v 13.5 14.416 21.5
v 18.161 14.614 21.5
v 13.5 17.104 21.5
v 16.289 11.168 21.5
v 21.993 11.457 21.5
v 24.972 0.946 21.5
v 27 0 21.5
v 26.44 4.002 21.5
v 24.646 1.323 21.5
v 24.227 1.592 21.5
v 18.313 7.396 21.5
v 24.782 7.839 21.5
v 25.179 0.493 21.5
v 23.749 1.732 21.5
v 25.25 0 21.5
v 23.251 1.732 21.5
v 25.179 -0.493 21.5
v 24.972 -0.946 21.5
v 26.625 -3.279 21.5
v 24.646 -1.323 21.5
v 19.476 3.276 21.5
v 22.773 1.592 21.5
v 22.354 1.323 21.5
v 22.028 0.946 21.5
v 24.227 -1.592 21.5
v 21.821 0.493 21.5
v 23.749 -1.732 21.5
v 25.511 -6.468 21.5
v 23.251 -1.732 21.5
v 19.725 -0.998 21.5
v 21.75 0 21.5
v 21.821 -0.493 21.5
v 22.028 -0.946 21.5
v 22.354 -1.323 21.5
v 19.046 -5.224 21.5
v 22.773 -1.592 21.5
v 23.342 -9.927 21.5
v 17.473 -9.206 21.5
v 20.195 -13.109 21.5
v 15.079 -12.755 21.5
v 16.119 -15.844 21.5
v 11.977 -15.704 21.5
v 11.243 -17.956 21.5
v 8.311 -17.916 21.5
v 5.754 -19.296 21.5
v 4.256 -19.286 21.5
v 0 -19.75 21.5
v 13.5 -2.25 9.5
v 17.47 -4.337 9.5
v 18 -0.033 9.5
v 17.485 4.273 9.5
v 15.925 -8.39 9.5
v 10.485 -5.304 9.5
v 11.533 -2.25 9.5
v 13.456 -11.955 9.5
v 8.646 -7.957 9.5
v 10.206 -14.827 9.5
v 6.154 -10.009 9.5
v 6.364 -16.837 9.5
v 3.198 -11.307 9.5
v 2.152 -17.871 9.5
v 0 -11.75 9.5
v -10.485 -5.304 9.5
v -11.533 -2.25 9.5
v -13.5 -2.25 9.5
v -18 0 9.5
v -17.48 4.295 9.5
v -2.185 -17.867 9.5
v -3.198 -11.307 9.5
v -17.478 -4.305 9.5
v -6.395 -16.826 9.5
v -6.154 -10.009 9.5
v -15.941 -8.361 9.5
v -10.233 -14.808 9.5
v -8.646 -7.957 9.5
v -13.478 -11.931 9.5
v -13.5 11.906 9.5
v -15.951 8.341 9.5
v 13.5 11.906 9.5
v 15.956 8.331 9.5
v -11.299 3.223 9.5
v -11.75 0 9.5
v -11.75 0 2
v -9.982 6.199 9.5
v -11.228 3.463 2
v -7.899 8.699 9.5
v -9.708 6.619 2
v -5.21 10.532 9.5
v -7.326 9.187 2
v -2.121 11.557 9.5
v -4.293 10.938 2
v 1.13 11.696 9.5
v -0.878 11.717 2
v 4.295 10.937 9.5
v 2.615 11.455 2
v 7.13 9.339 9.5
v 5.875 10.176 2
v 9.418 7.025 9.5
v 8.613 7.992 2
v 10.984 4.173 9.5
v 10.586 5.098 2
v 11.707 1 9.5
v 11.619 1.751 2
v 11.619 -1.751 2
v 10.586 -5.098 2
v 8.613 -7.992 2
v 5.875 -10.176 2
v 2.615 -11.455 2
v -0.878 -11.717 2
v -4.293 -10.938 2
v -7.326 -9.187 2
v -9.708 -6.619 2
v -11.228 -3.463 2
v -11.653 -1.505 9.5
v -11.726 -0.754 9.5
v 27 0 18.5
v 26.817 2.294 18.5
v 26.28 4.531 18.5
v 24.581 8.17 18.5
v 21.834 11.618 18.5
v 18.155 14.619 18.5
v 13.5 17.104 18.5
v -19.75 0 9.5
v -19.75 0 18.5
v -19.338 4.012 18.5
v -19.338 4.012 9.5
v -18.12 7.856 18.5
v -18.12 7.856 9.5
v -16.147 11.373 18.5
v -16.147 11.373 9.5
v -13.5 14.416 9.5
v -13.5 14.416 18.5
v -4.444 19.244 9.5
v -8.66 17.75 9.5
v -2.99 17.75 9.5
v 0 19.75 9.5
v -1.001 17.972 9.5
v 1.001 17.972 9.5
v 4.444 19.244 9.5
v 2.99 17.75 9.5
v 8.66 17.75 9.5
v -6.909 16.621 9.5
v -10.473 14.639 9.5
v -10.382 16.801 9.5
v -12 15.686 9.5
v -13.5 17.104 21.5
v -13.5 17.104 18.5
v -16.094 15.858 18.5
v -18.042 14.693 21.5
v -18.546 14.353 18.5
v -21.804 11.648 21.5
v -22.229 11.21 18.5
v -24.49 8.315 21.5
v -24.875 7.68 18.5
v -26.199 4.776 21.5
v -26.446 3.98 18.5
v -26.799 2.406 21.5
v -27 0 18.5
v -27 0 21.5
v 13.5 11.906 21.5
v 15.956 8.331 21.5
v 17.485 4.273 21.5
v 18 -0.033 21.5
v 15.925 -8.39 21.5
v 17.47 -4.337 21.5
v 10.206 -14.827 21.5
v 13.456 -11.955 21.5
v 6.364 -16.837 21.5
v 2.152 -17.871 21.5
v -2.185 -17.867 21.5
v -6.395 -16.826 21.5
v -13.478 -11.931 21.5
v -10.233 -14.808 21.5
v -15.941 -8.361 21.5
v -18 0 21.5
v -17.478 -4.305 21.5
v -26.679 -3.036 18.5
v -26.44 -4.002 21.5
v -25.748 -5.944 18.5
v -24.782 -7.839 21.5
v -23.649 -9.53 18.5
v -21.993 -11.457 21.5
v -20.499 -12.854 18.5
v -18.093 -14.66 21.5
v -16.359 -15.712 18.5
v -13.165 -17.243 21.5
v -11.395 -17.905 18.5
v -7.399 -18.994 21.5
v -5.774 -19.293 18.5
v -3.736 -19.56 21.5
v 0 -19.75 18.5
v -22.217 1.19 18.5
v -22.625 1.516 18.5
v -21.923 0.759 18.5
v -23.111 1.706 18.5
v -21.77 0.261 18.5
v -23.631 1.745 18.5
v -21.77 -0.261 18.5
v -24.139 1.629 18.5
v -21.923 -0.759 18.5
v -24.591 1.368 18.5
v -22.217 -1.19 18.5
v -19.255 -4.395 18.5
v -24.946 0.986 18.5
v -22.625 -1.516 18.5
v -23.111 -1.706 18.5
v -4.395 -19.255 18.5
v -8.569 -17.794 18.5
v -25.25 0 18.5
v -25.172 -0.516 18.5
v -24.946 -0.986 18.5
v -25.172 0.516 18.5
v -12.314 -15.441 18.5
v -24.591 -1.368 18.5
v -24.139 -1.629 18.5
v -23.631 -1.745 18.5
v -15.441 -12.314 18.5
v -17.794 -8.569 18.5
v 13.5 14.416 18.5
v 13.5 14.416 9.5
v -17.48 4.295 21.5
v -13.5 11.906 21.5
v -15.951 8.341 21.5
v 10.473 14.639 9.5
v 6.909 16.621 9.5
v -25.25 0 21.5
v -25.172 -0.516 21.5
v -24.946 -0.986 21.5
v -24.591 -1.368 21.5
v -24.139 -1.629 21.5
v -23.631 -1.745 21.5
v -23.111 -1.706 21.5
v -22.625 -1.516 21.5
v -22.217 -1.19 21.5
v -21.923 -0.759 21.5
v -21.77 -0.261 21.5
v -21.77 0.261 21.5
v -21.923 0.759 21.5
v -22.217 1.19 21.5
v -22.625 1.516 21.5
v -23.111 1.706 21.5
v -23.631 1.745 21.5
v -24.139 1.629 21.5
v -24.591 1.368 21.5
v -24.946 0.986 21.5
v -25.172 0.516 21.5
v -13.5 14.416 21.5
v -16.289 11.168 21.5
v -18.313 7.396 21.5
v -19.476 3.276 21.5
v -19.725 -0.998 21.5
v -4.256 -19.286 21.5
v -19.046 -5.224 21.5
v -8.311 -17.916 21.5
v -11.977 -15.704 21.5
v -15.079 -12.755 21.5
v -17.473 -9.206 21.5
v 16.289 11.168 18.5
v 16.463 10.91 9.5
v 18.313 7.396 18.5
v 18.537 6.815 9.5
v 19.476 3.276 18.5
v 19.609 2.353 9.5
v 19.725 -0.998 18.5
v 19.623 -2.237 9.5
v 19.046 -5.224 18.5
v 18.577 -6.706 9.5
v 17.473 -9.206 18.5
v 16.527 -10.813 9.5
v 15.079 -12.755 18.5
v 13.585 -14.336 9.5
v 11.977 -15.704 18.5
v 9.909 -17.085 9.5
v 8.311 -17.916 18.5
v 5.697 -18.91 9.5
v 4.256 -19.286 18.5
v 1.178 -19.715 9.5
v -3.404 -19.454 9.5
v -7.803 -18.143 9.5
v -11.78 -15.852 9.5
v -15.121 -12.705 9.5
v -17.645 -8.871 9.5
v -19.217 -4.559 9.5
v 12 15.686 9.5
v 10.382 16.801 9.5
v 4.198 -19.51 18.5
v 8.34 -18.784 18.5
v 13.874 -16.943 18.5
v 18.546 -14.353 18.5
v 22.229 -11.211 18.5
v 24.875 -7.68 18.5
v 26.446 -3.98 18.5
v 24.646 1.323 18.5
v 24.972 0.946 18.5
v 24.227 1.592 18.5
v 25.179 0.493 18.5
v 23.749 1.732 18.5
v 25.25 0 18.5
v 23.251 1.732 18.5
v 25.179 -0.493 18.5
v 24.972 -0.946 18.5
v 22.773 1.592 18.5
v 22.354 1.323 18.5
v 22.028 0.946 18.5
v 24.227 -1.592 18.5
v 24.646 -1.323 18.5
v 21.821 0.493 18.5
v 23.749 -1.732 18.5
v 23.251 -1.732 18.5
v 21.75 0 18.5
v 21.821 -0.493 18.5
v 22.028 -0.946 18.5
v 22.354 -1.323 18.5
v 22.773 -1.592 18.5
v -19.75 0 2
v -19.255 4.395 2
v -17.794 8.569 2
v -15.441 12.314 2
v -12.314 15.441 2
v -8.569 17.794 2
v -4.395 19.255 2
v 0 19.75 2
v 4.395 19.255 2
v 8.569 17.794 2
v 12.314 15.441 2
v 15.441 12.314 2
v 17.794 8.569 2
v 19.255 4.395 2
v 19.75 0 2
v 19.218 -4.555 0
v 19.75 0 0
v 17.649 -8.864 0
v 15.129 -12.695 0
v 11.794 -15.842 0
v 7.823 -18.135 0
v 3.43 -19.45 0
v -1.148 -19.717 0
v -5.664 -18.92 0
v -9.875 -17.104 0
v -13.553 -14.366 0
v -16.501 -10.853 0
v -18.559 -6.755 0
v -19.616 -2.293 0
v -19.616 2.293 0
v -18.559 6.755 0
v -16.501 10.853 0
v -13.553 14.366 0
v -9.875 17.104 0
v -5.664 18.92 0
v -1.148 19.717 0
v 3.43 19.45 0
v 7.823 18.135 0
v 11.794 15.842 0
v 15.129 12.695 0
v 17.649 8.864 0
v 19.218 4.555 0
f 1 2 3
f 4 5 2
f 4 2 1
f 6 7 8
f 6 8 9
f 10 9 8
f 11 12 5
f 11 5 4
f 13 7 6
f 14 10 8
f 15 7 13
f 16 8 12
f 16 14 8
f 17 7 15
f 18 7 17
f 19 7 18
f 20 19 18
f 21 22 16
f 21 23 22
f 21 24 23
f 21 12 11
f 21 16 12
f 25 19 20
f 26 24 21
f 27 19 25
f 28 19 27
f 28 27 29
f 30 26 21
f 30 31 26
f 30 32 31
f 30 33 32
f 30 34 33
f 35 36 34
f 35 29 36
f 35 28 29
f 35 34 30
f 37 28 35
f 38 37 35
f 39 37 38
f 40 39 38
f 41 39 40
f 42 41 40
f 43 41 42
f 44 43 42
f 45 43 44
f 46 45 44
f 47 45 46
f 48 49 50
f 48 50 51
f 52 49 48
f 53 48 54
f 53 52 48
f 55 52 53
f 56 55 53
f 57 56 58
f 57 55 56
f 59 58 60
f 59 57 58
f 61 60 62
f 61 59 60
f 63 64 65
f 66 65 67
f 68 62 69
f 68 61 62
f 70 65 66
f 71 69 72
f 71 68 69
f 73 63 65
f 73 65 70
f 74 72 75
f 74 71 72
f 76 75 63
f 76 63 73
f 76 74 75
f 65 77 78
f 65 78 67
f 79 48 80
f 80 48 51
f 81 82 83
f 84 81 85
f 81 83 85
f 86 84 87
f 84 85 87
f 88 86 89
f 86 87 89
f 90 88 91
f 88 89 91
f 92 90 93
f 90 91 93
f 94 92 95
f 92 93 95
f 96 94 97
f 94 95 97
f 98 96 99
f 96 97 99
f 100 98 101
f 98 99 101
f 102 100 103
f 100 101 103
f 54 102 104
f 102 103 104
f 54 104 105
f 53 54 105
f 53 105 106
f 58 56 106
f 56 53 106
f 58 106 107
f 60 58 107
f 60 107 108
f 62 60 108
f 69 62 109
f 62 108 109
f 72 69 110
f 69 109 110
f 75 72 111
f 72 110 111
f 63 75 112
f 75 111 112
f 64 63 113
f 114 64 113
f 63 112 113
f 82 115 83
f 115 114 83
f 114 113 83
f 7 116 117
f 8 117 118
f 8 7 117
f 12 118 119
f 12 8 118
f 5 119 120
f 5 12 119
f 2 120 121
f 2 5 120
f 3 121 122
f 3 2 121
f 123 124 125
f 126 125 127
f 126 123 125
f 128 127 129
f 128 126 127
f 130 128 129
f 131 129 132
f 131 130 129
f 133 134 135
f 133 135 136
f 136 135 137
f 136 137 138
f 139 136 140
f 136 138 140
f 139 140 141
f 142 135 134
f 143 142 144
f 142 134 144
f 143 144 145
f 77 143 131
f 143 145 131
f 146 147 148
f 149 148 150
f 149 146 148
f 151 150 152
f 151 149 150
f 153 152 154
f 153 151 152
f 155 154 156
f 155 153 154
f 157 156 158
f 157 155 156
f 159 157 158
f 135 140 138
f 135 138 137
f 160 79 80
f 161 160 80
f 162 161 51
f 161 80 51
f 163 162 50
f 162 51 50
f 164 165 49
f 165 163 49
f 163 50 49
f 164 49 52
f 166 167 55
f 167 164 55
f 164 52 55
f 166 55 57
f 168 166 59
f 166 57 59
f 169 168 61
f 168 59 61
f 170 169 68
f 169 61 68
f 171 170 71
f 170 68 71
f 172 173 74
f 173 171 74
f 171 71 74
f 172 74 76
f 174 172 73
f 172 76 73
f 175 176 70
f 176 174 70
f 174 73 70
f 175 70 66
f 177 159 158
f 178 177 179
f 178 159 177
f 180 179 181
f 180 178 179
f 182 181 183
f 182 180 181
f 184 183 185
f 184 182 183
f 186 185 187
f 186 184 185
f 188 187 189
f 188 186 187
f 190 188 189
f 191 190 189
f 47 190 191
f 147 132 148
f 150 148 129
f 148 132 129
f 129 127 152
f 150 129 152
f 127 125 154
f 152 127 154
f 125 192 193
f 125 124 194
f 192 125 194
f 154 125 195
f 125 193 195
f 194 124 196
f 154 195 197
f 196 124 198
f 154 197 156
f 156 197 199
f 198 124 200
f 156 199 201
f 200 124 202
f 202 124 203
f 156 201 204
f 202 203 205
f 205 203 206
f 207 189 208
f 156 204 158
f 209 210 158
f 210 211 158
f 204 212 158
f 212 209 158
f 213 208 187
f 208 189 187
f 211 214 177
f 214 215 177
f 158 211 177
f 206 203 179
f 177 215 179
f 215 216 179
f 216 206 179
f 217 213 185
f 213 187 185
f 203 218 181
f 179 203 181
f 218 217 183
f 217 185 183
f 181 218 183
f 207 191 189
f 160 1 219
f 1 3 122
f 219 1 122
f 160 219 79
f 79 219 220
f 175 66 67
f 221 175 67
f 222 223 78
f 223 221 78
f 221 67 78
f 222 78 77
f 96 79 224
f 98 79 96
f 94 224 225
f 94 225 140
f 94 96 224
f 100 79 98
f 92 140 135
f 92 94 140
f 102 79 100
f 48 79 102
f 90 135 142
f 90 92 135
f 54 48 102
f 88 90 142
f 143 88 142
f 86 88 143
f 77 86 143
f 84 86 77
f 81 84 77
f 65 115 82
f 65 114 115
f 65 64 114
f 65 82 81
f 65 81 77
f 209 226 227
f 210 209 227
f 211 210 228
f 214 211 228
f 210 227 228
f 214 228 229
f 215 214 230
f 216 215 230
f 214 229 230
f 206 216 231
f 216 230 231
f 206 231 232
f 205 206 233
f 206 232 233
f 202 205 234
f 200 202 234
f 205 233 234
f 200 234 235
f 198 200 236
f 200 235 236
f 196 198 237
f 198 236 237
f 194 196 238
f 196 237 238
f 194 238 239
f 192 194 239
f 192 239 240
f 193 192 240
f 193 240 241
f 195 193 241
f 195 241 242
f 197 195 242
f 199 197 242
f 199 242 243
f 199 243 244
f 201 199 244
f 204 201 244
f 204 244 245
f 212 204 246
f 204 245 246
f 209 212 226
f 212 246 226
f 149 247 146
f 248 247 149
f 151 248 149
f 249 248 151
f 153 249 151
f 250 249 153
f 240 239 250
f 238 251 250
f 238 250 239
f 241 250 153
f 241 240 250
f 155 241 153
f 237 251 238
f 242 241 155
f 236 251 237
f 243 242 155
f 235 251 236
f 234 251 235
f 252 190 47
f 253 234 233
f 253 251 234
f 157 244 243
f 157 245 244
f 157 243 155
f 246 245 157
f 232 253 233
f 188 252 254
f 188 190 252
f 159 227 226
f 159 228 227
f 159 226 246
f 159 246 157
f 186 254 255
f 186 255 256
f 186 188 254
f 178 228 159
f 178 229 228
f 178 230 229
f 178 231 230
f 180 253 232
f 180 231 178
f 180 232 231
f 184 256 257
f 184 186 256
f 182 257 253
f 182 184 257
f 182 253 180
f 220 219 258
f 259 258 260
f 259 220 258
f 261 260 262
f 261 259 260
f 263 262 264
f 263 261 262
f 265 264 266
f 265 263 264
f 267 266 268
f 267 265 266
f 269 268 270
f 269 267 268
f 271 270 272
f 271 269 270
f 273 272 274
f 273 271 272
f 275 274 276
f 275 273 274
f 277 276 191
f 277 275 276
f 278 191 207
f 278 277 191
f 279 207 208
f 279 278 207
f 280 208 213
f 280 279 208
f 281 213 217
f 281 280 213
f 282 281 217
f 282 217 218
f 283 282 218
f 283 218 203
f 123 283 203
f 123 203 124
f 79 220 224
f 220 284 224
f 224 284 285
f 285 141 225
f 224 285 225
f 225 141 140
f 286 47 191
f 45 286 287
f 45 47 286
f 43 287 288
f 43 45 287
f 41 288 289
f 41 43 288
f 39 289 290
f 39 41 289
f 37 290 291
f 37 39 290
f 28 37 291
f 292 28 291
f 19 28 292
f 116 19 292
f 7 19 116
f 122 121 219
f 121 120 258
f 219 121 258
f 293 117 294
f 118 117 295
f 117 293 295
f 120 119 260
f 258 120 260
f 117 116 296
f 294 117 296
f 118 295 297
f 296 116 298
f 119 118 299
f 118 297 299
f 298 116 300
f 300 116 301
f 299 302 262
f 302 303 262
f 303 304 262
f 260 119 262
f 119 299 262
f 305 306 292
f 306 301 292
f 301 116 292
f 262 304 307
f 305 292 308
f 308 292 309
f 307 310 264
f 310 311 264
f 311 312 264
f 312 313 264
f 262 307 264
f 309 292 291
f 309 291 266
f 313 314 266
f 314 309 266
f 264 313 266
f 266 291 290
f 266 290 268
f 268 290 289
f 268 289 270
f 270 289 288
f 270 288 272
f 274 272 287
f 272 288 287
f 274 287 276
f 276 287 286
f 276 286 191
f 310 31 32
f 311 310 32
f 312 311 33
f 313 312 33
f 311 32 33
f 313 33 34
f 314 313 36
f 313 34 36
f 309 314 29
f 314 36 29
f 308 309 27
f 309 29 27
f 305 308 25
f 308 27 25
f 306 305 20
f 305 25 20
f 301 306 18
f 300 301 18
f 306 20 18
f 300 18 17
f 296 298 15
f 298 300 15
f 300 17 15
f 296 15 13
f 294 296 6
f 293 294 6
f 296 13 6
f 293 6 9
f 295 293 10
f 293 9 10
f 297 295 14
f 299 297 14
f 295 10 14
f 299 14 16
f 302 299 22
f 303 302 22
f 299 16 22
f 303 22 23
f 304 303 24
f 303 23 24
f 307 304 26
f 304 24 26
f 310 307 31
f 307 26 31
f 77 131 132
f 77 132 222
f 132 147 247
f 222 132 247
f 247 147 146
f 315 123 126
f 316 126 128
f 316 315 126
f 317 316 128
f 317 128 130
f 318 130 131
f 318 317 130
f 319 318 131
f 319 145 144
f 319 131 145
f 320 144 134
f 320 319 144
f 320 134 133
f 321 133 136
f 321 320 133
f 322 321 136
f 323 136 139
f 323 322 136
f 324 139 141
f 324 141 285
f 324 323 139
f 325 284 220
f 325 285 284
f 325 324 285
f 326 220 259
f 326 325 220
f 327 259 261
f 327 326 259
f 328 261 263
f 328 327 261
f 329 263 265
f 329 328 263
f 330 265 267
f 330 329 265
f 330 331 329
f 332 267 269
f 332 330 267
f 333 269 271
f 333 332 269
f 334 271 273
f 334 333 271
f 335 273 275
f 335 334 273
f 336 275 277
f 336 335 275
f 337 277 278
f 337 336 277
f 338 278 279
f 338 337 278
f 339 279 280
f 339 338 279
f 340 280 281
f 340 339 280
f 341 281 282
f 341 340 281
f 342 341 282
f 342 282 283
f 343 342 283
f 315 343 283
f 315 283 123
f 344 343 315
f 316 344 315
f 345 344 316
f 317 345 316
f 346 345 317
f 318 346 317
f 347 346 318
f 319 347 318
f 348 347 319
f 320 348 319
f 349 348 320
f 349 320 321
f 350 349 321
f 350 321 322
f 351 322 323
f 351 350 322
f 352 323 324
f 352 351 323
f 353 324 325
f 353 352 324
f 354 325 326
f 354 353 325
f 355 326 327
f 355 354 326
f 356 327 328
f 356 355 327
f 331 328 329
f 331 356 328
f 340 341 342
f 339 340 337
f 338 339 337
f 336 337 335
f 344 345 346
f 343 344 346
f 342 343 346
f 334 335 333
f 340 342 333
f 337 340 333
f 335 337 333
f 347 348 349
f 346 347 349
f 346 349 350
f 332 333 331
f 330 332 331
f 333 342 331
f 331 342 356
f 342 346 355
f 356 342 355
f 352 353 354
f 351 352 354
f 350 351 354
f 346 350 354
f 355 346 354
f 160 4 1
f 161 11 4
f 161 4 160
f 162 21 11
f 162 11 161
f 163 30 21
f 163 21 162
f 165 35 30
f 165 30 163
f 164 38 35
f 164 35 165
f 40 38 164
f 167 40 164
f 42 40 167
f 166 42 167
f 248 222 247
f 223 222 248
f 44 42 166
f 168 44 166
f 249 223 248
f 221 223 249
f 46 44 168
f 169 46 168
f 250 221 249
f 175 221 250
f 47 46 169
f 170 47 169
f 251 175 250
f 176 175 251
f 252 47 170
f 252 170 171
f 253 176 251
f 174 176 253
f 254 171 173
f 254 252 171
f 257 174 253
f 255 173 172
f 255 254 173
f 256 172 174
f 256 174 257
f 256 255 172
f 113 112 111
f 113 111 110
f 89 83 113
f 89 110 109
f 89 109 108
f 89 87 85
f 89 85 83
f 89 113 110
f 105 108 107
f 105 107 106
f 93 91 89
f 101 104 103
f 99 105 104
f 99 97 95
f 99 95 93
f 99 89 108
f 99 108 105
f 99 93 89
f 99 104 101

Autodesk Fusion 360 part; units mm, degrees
sketch "Sketch1" plane through (0, 0, 0) normal (0, 0, 1) x (1, 0, 0)
  circle A0 centre (0, 0) radius 19.75
  dimension "d1" = 39.5
extrude "Extrude1" add sketch "Sketch1" along normal blind 2
sketch "Sketch2" plane through (0, 0, 2) normal (0, 0, 1) x (-1, 0, 0)
  circle A0 centre (0, 0) radius 19.75
  circle A1 centre (0, 0) radius 11.75
  circle A2 centre (0, 0) radius 19.75
  dimension "d4" = 23.5
extrude "Extrude2" add sketch "Sketch2" along normal blind 7.5
sketch "Sketch3" plane through (0, 0, 9.5) normal (0, 0, 1) x (-1, 0, 0)
  circle A0 centre (0, 0) radius 11.75
  circle A1 centre (0, 0) radius 19.75
  circle A2 centre (0, 0) radius 19.75
  circle A3 centre (0, 0) radius 18
  dimension "d7" = 36
extrude "Extrude3" add sketch "Sketch3" along normal blind 12 contours A1 A2
sketch "Sketch4" plane through (0, 0, 21.5) normal (0, 0, 1) x (-1, 0, 0)
  circle A0 centre (0, 0) radius 18
  circle A1 centre (0, 0) radius 19.75
  circle A2 centre (0, 0) radius 19.75
  line L0 (-27, -19.75) -> (27, -19.75)
  line L1 (27, -19.75) -> (27, 19.75)
  line L2 (27, 19.75) -> (-27, 19.75)
  line L3 (-27, 19.75) -> (-27, -19.75)
  line L4 (-27, -19.75) -> (27, 19.75) construction
  line L5 (27, -19.75) -> (-27, 19.75) construction
  line L6 (-27, 0) -> (-23.5, 0)
  line L7 (27, 0) -> (23.5, 0)
  circle A3 centre (23.5, 0) radius 1.75
  circle A4 centre (-23.5, 0) radius 1.75
  dimension "d10" = 39.5
  dimension "d11" = 54
  dimension "d12" = 3.5
  dimension "d13" = 3.5
  dimension "d14" = 3.5
  dimension "d15" = 3.5
extrude "Extrude4" add sketch "Sketch4" against normal blind 3 contours A1 A2 L0 L1 L2 | A1 A2 L0 L2 L3
sketch "Sketch5" plane through (0, 0, 21.5) normal (0, 0, 1) x (-1, 0, 0)
  circle A0 centre (23.5, 0) radius 1.75
  circle A1 centre (-23.5, 0) radius 1.75
  circle A2 centre (0, 0) radius 18
  line L0 (-27, -19.75) -> (27, -19.75)
  line L1 (27, -19.75) -> (27, 19.75)
  line L2 (27, 19.75) -> (-27, 19.75)
  line L3 (-27, 19.75) -> (-27, -19.75)
  ellipse E0 centre (0, 0) end of major axis (-27, 0) minor radius 19.75
  line L4 (27, 0) -> (-27, 0) construction
  line L5 (0, 19.75) -> (0, -19.75) construction
  line L6 (27, -19.75) -> (-27, -19.75)
  line L7 (-27, -19.75) -> (-27, 19.75)
  line L8 (-27, 19.75) -> (27, 19.75)
  line L9 (27, 19.75) -> (27, -19.75)
extrude "Extrude5" cut sketch "Sketch5" against normal blind 10 contours L0 L3 E0 L6 L7 | L0 L1 E0 L6 L9 | L2 L3 E0 L7 L8 | L1 L2 E0 L8 L9
ref_plane "WorkPlane1" through (0, 11.75, 7.4179) normal (0, -1, 0) x (-1, 0, 0)
ref_plane "WorkPlane2" through (0, 17.75, 7.4179) normal (0, -1, 0) x (-1, 0, 0)
sketch "Sketch6" plane through (0, 17.75, 0) normal (0, -1, 0) x (-1, 0, 0)
  line L0 (0, 0) -> (0, -15.5)
  line L1 (-30, -21.5) -> (30, -21.5)
  line L2 (30, -21.5) -> (30, -9.5)
  line L3 (30, -9.5) -> (-30, -9.5)
  line L4 (-30, -9.5) -> (-30, -21.5)
  line L5 (-30, -21.5) -> (30, -9.5) construction
  line L6 (30, -21.5) -> (-30, -9.5) construction
  line L7 (30, -21.5) -> (-30, -21.5)
  line L8 (-30, -21.5) -> (-30, -35.9601)
  line L9 (-30, -35.9601) -> (30, -35.9601)
  line L10 (30, -35.9601) -> (30, -21.5)
  point P0 (0, -15.5)
  dimension "d22" = 15.5
  dimension "d23" = 12
  dimension "d24" = 60
  dimension "d25" = 60
extrude "Extrude6" cut sketch "Sketch6" against normal blind 20
sketch "Sketch7" plane through (0, 17.75, 0) normal (0, 1, 0) x (-1, 0, 0)
  line L0 (-8.6603, 18.5) -> (-8.6603, 9.5)
  line L1 (-8.6603, 9.5) -> (-2.9896, 9.5)
  line L2 (-2.9896, 9.5) -> (-2.9896, 21.5)
  line L3 (-2.9896, 21.5) -> (-11.8393, 21.5)
  line L4 (-11.8393, 21.5) -> (-11.8393, 18.5)
  line L5 (-11.8393, 18.5) -> (-8.6603, 18.5)
  line L6 (13.5, 23.7273) -> (-13.5, 23.7273)
  line L7 (-13.5, 23.7273) -> (-13.5, -4.7273)
  line L8 (-13.5, -4.7273) -> (13.5, -4.7273)
  line L9 (13.5, -4.7273) -> (13.5, 23.7273)
  line L10 (13.5, 23.7273) -> (-13.5, -4.7273) construction
  line L11 (-13.5, 23.7273) -> (13.5, -4.7273) construction
  line L12 (0, 9.5) -> (13.5, 9.5)
  line L13 (0, 9.5) -> (-13.5, 9.5)
  point P0 (0, 9.5)
  dimension "d28" = 27
extrude "Extrude7" cut sketch "Sketch7" against normal blind 20 contours L0 L1 L2 L3 L4 L5 L13 | L0 L2 L3 L4 L5 L6 L7 L9 L12 L13
